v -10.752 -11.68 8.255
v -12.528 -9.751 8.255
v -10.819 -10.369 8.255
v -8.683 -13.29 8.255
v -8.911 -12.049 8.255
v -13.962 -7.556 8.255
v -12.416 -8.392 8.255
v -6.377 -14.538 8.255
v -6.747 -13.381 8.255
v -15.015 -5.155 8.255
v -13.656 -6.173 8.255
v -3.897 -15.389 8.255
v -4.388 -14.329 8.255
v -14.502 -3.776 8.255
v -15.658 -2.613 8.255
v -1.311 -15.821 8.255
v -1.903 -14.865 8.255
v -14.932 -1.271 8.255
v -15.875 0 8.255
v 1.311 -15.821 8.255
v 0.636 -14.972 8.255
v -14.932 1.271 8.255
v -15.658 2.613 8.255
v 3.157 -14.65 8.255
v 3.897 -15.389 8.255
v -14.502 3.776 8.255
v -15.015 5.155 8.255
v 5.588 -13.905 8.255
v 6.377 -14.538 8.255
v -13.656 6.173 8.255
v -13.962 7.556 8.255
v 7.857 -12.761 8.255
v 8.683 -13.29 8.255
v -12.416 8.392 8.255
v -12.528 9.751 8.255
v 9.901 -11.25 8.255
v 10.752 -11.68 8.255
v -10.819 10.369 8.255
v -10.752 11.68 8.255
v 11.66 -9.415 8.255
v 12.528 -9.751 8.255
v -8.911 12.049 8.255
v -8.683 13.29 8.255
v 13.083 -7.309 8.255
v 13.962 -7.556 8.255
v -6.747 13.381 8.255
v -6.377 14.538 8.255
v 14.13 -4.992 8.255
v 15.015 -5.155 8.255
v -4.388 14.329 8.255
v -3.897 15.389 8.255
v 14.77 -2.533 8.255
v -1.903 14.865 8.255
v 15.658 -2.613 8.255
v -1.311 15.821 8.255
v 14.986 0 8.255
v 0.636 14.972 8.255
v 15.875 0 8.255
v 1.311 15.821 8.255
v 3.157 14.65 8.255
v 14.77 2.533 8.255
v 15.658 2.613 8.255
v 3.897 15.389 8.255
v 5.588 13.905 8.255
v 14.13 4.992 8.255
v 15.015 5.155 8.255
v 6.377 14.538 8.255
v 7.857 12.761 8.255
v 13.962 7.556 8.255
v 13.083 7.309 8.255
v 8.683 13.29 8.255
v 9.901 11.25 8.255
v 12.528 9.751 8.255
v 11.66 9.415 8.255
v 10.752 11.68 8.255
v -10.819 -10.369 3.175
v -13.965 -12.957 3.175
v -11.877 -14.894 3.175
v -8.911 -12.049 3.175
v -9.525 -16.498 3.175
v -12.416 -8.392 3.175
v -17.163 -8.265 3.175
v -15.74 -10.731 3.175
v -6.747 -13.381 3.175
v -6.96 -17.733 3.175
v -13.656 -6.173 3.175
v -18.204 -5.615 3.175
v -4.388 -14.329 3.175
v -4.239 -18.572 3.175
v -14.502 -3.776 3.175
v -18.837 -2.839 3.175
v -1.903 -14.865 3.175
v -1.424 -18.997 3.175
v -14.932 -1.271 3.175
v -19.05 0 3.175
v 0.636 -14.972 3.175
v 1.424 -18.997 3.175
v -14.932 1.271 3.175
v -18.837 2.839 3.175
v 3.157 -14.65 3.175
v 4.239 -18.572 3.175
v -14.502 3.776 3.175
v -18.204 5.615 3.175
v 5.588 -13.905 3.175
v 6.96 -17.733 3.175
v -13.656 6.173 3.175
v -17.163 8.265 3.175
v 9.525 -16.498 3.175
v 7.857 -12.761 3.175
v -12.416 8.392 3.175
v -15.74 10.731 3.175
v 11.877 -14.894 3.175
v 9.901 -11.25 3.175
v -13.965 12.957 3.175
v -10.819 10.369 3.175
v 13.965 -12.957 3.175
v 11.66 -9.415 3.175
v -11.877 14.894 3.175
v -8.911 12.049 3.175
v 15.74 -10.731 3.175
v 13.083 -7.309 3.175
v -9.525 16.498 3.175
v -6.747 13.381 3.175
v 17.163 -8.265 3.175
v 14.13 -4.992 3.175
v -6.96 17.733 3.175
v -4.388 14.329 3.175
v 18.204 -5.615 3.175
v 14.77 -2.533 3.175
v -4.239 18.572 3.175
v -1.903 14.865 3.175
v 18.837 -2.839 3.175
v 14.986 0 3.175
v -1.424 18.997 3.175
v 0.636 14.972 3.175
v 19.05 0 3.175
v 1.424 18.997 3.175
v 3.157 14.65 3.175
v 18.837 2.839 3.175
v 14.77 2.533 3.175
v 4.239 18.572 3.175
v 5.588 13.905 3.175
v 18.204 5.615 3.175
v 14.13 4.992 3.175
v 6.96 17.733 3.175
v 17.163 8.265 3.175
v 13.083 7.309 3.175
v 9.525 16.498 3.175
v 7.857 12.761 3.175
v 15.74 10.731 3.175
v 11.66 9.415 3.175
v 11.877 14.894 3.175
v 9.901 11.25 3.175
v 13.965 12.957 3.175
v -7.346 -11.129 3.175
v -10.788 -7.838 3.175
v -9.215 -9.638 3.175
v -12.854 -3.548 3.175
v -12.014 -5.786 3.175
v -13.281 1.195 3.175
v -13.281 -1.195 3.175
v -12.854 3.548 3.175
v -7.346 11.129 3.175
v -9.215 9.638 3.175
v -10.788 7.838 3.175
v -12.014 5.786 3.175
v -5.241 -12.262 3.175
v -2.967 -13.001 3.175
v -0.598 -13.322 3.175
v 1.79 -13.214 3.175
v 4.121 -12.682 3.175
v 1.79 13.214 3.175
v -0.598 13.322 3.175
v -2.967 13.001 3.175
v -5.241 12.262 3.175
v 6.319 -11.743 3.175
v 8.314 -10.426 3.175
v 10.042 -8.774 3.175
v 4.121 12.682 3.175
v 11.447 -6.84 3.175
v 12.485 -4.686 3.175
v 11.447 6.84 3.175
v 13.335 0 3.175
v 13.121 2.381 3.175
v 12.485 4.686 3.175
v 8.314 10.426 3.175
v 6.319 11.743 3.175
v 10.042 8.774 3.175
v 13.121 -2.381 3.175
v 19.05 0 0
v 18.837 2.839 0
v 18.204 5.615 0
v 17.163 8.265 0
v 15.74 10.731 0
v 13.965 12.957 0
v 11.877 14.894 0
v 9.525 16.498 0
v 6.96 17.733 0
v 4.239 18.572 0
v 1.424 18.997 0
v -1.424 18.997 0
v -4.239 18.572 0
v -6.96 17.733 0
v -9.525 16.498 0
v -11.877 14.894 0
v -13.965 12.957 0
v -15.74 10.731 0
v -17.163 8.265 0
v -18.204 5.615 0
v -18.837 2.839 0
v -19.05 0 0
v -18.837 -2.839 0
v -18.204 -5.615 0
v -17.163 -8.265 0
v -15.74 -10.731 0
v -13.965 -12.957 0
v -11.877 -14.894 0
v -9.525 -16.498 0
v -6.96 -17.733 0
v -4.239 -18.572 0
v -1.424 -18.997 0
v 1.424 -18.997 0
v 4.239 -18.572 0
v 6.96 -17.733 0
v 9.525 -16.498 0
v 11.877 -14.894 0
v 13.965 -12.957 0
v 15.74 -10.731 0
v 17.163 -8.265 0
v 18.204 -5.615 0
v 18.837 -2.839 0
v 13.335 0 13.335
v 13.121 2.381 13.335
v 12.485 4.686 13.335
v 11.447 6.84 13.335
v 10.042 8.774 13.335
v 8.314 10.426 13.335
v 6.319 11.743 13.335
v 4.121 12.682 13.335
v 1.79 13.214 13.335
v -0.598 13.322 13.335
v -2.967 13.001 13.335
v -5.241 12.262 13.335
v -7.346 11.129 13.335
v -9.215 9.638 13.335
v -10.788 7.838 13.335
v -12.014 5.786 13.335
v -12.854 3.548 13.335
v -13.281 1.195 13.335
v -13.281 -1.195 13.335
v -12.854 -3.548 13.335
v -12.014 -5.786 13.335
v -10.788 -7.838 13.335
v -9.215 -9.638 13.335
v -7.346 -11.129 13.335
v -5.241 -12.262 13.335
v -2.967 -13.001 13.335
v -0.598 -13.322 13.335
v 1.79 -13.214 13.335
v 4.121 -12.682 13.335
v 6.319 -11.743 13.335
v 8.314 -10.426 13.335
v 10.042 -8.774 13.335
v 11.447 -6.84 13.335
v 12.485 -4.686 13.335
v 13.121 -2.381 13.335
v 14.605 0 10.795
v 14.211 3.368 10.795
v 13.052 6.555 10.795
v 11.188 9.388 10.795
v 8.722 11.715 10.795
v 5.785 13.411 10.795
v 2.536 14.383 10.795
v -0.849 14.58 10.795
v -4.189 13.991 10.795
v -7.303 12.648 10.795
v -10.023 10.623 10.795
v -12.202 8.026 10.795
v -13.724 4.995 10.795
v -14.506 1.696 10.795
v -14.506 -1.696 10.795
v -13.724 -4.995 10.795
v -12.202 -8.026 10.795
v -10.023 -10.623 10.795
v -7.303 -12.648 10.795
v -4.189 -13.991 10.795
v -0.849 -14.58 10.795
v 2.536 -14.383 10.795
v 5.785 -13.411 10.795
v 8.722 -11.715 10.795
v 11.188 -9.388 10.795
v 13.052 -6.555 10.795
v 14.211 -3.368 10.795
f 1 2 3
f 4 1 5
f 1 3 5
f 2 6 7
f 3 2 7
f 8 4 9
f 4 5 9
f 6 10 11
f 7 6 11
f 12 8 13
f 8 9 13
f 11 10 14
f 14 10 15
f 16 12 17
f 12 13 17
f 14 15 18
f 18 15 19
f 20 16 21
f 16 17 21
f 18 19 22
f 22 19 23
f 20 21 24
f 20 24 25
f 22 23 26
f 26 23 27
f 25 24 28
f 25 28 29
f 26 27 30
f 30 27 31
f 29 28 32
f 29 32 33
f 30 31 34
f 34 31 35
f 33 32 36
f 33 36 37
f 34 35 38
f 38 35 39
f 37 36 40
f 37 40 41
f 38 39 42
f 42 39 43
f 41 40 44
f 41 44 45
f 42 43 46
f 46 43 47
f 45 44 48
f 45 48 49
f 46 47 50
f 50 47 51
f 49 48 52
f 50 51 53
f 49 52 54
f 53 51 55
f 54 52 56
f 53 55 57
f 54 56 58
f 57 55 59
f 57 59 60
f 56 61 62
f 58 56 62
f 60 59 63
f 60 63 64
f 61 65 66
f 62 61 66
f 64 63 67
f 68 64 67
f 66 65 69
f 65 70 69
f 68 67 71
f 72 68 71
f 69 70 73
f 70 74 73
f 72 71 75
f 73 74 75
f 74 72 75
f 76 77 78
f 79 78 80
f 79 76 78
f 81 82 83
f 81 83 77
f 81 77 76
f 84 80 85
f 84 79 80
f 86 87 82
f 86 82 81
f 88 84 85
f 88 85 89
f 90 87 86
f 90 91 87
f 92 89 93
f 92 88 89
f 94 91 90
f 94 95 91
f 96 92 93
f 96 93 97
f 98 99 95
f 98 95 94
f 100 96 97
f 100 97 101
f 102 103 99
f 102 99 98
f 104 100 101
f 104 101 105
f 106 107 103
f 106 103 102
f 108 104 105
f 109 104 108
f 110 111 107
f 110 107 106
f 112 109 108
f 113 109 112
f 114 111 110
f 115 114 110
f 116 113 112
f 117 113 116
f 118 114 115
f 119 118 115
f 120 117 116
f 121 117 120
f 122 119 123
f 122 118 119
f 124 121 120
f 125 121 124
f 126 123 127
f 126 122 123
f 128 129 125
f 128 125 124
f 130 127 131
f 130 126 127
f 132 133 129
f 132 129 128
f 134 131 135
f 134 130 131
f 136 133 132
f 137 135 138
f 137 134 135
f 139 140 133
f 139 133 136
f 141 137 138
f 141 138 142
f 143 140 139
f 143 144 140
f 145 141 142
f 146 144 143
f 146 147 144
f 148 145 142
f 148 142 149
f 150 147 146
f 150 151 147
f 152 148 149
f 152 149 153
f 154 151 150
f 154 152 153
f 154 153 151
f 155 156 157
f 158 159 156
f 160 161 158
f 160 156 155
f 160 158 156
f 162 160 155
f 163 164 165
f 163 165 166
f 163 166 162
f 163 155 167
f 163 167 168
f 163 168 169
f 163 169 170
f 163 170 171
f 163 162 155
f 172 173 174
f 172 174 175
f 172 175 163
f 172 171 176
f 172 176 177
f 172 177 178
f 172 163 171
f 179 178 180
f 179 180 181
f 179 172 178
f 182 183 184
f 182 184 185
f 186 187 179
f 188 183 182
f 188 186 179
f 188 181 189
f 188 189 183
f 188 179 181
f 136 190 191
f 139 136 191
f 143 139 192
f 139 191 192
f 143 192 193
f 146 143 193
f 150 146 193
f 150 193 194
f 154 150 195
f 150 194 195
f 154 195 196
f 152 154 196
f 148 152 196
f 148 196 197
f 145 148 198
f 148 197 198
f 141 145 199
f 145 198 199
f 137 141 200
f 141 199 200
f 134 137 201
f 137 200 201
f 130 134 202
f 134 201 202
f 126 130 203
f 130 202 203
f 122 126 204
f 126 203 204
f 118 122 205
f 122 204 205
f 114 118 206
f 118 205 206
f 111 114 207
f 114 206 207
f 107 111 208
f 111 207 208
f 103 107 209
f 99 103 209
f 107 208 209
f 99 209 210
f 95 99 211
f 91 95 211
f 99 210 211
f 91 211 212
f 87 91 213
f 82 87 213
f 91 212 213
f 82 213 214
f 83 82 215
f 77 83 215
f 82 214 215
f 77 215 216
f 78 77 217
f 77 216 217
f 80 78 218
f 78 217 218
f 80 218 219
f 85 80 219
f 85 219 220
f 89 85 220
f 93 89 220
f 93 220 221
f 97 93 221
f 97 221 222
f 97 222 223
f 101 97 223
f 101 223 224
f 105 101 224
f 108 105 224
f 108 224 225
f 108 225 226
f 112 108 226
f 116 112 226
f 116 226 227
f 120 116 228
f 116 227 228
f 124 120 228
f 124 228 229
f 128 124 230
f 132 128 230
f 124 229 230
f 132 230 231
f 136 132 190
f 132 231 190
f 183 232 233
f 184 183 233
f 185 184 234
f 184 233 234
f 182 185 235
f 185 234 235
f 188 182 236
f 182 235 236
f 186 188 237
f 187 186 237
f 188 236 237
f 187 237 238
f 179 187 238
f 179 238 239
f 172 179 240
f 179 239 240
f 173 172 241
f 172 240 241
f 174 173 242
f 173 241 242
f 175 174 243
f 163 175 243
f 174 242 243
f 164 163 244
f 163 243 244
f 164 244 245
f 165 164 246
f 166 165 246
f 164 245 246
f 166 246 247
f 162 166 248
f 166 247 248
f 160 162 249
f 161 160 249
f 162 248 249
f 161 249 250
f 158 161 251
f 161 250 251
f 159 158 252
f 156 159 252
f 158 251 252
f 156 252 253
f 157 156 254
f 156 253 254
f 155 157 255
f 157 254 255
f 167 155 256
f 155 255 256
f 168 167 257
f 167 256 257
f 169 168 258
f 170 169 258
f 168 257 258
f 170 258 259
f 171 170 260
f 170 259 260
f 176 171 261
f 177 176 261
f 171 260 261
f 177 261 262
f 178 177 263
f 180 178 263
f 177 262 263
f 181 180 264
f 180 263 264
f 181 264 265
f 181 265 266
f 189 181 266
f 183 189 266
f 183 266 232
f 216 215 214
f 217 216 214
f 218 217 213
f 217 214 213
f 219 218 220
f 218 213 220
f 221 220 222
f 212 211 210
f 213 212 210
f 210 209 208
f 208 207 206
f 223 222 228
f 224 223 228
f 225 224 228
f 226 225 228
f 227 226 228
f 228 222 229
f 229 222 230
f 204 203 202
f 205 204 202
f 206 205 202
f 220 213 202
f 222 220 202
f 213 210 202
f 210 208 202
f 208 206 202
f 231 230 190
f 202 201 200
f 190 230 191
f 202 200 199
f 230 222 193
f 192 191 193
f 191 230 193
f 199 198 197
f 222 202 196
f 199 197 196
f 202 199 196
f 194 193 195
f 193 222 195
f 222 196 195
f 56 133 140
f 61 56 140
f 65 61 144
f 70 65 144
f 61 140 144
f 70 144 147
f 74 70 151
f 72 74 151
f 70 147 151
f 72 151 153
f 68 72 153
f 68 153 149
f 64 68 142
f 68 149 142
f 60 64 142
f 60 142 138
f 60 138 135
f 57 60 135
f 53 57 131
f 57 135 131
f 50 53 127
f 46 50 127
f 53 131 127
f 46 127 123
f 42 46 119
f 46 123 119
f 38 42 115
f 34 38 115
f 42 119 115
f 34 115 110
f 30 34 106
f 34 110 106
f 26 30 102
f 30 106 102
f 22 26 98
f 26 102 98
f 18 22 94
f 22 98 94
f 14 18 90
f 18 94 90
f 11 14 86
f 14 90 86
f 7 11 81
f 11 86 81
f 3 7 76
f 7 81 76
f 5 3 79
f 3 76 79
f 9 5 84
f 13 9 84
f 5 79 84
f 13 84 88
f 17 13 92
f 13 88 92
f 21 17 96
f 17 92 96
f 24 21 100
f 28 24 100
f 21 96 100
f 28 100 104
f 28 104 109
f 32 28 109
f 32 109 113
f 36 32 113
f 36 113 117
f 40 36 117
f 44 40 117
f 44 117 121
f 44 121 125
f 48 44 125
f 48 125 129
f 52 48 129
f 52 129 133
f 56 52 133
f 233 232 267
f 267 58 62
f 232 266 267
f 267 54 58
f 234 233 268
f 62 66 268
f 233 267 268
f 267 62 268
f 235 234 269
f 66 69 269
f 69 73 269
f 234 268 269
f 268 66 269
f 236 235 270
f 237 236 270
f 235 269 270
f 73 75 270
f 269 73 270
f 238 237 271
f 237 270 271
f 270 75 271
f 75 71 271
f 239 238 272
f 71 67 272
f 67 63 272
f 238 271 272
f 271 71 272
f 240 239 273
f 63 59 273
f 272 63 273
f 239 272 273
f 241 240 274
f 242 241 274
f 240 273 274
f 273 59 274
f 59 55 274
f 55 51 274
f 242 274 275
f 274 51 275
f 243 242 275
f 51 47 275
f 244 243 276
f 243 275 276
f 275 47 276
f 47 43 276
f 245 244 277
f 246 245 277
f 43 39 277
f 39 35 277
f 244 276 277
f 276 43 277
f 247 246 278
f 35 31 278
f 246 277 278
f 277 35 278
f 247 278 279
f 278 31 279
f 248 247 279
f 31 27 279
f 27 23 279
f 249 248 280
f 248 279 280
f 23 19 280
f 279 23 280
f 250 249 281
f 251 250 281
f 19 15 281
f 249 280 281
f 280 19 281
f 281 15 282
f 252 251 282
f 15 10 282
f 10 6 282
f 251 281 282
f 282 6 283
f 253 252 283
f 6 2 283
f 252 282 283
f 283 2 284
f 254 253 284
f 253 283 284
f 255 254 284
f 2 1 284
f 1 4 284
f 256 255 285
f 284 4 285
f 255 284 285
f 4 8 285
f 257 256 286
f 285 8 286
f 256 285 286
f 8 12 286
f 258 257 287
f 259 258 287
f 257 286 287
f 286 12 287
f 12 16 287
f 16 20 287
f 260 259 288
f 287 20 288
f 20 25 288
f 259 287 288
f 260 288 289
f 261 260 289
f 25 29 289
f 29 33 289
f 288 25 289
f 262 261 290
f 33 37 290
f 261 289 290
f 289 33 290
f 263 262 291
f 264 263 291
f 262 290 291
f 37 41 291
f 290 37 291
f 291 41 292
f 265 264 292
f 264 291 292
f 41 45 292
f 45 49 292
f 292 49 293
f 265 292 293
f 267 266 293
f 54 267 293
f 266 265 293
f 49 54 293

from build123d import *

# Parameters (mm, degrees)
F0_R     = 19.05
F1_DEPTH = 3.175
F2_R     = 14.986
F3_DEPTH = 5.08
F4_R     = 15.875
F5_DEPTH = 5.08
F6_SIZE2 = 5.07999
F6_SIZE  = 2.53999
F7_DEPTH = 10.16


# Not quite as in the source:
# - a fillet or chamfer is up to 0.001 mm smaller than in the source, because OpenCascade refuses the exact size


with BuildPart() as f1:
    # F0 (on Top) → F1 (new body)
    with BuildSketch(Plane.XY):
        Circle(F0_R)
    extrude(amount=F1_DEPTH)

    # F2 (on face) → F3 (join)
    with BuildSketch(Plane.XY.offset(3.175)):
        Circle(F2_R)
    extrude(amount=F3_DEPTH)

    # F4 (on face) → F5 (join)
    with BuildSketch(Plane.XY.offset(8.255)):
        Circle(F4_R)
    extrude(amount=F5_DEPTH)

    # F6 (size 2.54 and 5.08 in the source; OpenCascade refuses exactly that, so slightly less here)
    f6_edges = [f1.edges().sort_by_distance(p)[0] for p in [
        (-15.875, 0, 13.335),
    ]]
    f6_side = f1.faces().sort_by_distance((0, 0, 13.335))[0]
    chamfer(f6_edges, length=F6_SIZE, length2=F6_SIZE2, reference=f6_side)

    # F7 (cut): a face of the model
    f7_faces = [f1.faces().sort_by_distance(p)[0] for p in [
        (0, 0, 13.335),
    ]]
    extrude(f7_faces, amount=-F7_DEPTH, mode=Mode.SUBTRACT)


solid = f1.part
